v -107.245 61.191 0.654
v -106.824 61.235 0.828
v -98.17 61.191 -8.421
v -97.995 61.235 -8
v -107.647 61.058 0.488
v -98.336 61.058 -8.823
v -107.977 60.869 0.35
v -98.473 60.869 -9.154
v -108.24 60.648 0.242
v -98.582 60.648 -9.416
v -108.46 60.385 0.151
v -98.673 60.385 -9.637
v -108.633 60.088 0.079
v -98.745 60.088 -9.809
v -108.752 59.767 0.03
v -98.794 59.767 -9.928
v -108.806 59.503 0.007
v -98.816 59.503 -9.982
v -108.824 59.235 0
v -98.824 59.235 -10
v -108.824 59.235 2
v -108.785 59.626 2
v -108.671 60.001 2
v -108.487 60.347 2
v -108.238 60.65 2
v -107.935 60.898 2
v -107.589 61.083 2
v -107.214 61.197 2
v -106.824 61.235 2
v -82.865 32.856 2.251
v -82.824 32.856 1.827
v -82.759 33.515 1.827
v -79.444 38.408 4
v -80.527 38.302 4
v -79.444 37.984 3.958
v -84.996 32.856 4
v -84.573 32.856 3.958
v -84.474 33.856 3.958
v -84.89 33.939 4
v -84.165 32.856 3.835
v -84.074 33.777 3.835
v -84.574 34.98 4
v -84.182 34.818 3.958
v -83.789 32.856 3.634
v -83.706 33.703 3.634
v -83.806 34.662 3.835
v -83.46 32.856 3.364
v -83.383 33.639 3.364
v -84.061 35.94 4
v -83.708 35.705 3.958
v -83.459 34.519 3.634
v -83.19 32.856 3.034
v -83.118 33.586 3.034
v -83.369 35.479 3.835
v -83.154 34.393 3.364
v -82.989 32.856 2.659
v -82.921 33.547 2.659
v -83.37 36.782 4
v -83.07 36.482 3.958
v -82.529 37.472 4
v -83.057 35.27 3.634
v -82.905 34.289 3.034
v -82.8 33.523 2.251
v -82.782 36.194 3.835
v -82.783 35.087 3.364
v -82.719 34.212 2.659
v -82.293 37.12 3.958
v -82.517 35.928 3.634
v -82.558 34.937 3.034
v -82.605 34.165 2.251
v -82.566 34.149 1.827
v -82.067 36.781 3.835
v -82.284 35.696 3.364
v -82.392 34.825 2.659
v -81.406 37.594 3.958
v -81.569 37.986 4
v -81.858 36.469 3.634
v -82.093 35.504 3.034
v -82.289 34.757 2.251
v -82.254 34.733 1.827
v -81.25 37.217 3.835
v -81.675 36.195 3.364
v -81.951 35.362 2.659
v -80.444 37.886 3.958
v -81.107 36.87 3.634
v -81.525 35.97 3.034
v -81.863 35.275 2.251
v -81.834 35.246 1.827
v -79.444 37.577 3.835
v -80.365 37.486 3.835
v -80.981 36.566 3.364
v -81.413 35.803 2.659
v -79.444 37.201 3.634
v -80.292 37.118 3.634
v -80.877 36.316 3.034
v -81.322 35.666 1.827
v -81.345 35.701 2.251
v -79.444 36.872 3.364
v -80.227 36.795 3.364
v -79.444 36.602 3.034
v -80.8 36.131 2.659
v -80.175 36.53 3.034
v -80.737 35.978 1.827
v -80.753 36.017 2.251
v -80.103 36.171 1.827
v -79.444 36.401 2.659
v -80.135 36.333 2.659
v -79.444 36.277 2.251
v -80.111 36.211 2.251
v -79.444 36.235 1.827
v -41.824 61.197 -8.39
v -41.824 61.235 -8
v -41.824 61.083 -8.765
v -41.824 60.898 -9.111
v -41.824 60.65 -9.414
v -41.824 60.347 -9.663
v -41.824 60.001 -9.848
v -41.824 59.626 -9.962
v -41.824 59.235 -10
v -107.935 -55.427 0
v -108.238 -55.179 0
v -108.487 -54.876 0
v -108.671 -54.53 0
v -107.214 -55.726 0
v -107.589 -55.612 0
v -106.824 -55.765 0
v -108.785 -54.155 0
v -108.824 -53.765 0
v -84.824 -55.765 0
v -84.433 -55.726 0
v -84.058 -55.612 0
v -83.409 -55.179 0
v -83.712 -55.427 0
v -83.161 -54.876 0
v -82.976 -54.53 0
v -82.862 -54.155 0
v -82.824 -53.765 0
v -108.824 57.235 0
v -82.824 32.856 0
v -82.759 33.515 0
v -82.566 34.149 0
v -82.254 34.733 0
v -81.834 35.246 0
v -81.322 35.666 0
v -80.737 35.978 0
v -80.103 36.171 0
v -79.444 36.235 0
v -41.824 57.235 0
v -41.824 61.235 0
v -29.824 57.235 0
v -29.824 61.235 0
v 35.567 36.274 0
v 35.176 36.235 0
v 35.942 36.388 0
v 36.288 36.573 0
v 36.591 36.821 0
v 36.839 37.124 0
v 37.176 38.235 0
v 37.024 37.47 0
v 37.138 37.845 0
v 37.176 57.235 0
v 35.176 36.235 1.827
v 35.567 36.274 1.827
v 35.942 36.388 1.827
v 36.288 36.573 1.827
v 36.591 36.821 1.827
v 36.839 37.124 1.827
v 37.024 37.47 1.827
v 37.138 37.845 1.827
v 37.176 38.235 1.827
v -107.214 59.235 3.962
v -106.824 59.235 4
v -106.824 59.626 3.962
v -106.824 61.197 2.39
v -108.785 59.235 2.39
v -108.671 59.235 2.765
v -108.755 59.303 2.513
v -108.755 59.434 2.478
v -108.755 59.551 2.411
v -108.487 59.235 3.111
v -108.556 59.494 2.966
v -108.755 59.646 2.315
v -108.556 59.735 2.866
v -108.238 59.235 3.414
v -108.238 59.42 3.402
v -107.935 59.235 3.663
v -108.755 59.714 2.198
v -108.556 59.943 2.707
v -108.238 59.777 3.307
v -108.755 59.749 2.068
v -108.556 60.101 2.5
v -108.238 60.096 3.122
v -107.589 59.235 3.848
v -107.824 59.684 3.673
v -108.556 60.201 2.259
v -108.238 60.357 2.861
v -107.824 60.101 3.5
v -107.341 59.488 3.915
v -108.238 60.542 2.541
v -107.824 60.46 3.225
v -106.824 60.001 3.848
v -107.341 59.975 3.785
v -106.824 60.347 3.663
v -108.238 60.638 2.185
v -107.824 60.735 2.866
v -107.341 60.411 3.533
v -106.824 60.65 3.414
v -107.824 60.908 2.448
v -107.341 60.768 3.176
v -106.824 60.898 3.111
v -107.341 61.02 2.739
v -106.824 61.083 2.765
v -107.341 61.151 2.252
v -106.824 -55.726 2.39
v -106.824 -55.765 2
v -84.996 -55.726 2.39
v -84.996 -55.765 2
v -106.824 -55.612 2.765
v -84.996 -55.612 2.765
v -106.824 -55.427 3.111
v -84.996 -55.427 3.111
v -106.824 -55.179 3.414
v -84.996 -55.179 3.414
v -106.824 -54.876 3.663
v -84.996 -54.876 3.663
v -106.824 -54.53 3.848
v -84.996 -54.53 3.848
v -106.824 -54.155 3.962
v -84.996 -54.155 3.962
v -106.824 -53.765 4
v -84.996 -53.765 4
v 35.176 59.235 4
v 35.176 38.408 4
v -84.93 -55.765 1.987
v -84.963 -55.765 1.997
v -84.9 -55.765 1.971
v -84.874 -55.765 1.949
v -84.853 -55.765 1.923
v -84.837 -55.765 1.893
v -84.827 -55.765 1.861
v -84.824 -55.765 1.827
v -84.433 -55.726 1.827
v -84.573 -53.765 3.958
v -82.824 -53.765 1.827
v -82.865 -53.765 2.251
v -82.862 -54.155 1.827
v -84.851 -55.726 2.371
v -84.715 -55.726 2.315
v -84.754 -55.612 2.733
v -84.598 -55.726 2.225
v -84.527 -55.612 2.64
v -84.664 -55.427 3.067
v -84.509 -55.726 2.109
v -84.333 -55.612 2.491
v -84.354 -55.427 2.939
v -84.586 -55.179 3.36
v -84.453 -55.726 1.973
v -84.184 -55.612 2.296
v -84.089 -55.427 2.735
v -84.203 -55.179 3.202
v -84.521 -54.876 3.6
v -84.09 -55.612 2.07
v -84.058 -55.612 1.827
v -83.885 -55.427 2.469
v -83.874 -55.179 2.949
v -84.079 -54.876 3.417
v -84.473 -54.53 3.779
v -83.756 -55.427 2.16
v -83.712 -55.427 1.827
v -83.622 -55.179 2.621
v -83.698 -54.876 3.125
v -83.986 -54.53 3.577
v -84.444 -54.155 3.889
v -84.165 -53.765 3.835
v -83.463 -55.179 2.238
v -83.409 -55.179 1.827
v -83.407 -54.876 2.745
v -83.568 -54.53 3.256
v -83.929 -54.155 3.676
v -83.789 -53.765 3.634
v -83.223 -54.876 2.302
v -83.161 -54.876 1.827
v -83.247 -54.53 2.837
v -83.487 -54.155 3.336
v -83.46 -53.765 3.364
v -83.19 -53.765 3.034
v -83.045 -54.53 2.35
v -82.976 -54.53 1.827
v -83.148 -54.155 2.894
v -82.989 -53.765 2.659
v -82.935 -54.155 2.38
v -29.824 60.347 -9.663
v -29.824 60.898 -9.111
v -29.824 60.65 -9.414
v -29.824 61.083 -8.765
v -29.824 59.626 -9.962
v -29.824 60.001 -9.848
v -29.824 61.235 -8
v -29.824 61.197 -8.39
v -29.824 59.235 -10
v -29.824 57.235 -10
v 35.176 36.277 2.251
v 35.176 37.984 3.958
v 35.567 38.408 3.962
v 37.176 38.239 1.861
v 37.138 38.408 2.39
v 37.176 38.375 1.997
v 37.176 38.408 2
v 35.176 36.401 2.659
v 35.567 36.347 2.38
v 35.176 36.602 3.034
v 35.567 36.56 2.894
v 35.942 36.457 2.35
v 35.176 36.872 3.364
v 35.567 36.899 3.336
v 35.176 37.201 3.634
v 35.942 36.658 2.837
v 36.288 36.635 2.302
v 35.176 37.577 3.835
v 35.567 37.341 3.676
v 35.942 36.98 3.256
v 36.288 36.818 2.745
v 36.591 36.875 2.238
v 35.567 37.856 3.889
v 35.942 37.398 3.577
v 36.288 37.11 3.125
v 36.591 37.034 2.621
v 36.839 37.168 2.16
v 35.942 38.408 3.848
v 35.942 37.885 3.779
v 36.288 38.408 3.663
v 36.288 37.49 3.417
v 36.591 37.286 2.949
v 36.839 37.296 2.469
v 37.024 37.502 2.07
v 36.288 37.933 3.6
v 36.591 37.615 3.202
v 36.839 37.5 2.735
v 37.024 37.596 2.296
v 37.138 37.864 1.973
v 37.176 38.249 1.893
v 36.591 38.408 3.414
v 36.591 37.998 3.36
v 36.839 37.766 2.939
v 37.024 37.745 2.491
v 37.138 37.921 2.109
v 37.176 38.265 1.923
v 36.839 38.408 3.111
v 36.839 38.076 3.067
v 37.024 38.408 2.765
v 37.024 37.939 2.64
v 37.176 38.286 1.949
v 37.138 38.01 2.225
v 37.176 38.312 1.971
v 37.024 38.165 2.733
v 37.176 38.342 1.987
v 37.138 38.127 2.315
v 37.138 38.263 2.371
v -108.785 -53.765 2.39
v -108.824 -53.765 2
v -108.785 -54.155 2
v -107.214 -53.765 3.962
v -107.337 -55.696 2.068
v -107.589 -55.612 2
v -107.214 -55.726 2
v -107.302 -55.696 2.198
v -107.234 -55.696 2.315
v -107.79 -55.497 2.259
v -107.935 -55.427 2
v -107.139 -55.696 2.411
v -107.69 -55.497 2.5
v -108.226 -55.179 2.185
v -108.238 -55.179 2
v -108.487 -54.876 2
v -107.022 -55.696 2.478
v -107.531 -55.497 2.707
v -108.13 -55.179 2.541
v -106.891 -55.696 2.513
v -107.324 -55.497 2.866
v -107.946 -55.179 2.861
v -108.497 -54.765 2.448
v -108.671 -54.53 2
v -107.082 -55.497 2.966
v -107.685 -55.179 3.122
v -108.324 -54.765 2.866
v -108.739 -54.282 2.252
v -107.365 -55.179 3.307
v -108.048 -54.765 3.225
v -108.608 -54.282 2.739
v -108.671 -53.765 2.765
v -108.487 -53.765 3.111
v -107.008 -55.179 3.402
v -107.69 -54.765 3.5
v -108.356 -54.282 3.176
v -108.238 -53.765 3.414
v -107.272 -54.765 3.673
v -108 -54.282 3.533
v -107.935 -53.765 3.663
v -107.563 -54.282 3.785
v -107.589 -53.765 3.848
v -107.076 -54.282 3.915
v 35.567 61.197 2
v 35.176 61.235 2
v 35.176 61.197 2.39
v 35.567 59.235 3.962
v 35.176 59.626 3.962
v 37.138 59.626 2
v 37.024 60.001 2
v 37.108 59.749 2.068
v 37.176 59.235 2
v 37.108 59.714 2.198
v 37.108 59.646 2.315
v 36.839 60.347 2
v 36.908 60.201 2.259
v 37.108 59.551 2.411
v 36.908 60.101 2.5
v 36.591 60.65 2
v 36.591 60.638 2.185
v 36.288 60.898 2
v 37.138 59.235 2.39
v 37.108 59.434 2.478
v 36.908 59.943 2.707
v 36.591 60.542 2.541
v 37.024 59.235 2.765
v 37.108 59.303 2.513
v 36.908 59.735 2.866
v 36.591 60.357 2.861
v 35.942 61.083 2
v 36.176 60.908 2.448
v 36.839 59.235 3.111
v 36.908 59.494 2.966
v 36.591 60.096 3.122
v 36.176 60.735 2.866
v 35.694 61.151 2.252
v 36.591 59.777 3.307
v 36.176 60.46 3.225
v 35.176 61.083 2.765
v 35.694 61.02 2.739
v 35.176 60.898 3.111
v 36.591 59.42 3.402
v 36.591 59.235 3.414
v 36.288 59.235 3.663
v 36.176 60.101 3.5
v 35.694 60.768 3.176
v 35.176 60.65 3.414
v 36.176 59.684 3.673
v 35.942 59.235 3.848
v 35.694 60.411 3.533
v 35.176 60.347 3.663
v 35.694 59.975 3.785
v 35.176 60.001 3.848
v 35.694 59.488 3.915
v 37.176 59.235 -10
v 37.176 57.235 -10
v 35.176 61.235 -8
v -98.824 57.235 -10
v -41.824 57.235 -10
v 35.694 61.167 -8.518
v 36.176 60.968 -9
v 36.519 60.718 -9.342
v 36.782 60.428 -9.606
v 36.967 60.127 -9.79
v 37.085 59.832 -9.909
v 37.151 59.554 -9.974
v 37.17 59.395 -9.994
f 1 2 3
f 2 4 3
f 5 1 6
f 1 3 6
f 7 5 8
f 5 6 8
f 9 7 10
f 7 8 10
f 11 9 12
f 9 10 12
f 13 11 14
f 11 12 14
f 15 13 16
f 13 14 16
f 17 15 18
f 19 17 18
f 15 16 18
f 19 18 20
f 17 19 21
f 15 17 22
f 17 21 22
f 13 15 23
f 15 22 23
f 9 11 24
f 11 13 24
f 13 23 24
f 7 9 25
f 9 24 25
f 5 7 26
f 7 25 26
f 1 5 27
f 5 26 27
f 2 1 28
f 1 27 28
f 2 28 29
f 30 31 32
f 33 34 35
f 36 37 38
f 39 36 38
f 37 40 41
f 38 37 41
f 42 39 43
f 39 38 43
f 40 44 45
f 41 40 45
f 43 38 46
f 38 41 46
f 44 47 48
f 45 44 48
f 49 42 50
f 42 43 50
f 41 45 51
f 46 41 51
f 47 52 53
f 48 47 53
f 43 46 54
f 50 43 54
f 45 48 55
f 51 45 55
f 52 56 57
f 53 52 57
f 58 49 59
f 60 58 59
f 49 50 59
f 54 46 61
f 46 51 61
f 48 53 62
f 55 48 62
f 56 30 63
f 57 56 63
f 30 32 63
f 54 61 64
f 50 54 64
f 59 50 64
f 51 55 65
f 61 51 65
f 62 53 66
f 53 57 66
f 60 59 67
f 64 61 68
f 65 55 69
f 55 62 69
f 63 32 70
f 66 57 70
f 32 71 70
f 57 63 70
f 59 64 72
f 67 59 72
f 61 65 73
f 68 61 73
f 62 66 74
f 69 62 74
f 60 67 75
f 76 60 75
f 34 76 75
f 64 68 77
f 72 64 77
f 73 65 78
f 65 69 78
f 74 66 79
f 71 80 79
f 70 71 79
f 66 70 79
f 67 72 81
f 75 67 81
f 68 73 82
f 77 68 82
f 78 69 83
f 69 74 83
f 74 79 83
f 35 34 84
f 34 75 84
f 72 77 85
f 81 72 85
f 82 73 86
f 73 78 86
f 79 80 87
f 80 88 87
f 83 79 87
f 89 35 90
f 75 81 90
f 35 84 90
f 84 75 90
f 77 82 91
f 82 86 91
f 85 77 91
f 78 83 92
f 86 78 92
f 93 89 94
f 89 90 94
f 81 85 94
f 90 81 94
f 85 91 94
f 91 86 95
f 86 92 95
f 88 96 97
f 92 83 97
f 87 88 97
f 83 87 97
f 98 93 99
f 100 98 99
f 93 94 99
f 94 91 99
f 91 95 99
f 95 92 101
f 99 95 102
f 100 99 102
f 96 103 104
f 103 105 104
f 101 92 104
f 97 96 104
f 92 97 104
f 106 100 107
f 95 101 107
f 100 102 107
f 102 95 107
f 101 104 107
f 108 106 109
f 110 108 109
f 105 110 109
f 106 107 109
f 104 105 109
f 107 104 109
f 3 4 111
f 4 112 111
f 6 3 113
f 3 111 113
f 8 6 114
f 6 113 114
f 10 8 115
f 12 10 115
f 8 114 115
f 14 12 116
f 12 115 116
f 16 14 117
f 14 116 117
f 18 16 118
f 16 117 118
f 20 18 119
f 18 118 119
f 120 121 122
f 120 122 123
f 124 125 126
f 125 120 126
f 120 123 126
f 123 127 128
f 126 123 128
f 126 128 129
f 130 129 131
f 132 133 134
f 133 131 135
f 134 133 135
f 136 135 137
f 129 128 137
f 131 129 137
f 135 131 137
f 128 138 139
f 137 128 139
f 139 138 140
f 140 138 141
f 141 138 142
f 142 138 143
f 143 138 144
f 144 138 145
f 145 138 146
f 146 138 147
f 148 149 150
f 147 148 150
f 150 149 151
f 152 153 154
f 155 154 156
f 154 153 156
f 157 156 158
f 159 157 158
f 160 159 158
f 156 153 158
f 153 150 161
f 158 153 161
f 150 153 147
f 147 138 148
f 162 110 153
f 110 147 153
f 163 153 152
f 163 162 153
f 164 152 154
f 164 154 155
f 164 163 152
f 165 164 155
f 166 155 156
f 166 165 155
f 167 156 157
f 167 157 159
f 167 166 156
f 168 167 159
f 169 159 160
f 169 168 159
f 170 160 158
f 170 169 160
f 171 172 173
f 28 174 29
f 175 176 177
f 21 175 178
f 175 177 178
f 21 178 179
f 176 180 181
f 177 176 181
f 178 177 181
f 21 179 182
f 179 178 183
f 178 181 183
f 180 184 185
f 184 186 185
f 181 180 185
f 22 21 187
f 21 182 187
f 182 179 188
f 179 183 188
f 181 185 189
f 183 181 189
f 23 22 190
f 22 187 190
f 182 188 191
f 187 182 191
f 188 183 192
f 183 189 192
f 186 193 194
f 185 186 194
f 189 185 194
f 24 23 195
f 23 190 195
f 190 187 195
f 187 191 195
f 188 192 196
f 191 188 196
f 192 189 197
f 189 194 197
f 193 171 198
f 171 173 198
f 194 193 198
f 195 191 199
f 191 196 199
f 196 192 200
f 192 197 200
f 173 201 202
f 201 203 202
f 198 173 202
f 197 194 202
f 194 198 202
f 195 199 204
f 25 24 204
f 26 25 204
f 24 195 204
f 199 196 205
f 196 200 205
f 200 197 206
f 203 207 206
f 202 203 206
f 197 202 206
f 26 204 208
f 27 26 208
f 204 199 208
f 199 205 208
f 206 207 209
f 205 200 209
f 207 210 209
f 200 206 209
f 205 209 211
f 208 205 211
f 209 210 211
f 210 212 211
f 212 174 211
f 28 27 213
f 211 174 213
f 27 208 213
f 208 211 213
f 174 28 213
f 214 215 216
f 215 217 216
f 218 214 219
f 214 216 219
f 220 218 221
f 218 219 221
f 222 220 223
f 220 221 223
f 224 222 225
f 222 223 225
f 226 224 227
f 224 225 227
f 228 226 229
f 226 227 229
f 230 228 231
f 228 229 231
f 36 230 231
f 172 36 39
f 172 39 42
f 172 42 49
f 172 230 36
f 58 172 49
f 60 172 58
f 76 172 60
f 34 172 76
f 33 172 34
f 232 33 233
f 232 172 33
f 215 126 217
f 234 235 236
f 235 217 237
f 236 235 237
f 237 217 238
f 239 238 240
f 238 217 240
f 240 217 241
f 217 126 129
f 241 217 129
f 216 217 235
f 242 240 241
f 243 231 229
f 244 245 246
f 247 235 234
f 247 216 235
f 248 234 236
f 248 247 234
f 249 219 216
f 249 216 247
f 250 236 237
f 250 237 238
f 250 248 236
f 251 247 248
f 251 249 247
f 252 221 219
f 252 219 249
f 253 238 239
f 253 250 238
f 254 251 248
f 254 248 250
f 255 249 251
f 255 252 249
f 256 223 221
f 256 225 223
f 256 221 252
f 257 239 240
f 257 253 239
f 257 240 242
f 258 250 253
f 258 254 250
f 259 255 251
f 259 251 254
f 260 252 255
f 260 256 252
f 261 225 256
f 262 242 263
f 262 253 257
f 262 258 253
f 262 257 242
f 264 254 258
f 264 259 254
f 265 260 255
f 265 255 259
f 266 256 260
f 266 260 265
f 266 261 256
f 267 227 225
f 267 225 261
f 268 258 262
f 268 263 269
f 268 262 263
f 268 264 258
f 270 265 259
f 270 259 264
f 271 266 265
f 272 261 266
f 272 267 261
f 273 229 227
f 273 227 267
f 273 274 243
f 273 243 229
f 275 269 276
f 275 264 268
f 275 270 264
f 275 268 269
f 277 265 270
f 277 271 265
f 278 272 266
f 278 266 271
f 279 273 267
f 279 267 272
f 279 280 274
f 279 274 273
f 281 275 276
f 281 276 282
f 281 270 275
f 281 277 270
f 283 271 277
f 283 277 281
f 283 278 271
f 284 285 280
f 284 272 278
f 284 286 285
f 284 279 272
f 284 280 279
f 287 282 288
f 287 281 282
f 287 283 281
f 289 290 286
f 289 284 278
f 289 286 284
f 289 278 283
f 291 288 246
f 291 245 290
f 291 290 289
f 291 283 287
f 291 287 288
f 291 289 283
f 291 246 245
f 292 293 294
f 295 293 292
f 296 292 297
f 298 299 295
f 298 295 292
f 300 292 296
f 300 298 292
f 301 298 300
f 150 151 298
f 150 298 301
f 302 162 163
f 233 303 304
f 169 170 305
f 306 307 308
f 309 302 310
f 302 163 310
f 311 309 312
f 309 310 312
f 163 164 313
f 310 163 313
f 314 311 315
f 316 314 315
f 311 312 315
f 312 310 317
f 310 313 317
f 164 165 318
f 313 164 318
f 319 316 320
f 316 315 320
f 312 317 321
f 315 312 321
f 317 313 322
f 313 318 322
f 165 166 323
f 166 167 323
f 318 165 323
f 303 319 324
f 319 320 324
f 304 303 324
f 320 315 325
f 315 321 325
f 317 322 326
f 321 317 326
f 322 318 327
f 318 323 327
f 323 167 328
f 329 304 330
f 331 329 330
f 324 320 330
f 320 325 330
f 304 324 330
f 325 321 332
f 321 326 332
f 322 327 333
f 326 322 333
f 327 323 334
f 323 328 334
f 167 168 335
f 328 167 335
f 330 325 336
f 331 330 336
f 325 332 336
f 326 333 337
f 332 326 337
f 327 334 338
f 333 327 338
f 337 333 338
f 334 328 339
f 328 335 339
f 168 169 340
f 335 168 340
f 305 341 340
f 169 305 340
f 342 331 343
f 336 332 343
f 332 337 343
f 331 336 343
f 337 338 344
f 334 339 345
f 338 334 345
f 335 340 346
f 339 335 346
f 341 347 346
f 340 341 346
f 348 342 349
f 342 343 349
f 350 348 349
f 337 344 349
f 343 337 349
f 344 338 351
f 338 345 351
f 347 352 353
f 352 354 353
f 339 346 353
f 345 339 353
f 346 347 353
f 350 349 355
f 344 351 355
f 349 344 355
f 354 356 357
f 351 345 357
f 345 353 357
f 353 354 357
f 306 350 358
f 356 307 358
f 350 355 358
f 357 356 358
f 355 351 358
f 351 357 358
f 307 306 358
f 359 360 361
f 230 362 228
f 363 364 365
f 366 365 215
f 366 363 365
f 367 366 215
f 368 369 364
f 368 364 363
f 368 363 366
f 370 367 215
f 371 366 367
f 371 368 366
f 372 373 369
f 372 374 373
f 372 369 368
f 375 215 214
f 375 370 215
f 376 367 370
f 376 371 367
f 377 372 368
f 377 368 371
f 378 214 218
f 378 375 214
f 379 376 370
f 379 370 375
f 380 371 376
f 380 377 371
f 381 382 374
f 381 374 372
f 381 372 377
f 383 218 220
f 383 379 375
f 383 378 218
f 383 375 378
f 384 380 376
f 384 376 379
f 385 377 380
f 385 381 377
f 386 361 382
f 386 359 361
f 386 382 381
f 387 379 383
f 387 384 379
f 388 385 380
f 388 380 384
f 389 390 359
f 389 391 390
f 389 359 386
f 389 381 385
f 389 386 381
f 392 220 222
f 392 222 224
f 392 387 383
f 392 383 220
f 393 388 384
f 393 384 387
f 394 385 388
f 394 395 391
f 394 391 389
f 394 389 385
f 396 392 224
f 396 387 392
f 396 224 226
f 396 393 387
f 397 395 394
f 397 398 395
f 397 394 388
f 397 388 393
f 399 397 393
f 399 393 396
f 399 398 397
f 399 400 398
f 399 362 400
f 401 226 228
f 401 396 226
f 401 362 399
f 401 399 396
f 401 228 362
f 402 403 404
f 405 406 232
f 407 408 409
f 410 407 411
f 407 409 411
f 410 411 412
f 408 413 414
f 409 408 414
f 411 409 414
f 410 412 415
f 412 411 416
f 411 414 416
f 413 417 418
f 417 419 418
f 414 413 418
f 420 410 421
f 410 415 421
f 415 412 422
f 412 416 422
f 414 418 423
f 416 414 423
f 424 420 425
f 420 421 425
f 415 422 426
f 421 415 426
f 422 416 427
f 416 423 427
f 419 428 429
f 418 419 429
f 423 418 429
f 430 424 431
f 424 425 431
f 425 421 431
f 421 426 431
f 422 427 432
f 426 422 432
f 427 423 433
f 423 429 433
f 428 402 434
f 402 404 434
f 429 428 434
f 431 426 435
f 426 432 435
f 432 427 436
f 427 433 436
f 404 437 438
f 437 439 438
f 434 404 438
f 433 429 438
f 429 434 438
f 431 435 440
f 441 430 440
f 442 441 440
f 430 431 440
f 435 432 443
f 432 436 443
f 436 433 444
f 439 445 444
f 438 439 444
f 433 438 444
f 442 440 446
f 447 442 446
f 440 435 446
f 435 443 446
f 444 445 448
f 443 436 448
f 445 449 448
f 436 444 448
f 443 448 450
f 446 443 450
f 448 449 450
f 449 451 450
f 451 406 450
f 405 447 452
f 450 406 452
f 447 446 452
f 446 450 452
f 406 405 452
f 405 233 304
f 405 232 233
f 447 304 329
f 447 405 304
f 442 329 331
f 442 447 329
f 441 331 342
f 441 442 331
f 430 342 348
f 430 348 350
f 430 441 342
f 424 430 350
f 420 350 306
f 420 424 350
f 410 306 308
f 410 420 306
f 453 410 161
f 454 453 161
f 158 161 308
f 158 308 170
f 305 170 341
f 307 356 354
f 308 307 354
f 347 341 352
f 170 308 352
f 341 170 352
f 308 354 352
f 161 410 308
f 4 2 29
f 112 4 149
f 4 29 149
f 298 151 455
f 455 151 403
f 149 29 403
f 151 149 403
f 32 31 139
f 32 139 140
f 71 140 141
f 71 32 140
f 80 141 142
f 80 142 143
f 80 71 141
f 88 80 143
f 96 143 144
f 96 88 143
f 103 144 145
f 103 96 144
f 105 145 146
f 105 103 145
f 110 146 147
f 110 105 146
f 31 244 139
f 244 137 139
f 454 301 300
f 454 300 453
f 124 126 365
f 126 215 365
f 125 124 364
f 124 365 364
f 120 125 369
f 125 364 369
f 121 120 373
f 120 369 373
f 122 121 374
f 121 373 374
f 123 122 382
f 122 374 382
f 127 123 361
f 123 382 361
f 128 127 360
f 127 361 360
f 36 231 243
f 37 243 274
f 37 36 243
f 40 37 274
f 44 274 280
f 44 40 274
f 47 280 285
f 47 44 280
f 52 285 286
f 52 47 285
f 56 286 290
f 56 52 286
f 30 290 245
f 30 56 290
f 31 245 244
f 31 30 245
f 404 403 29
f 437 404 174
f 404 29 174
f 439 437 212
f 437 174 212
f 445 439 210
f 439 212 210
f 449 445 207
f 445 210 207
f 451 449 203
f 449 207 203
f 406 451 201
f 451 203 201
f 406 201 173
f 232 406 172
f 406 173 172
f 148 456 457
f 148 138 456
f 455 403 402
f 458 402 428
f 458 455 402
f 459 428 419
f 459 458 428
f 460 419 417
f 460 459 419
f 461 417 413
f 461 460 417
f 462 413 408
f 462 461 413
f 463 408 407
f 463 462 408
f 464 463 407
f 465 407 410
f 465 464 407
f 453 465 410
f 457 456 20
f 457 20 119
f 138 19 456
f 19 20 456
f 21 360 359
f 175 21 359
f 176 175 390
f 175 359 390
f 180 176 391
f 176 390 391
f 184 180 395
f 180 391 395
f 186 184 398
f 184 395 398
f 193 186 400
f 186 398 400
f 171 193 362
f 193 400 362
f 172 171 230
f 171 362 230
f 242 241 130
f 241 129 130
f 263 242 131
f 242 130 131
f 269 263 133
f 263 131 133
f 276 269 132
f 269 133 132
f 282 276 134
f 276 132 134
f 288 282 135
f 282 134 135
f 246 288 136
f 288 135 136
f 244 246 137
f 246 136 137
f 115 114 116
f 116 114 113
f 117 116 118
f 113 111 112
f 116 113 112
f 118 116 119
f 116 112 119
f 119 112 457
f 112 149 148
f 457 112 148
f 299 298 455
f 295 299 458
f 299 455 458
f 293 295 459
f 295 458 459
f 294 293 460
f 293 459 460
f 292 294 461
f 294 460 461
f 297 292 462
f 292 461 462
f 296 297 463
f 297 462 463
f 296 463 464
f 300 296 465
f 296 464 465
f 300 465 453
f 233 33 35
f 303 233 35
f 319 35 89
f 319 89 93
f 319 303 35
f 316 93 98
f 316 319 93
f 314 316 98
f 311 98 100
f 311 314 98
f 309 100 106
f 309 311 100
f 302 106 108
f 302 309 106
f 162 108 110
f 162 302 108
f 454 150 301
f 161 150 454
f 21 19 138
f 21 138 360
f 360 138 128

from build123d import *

# Parameters (mm, degrees)
F1_DEPTH = 4
F2_W     = 67
F2_H     = 4
F3_DEPTH = 10
F4_R     = 3.3798989873
F5_R     = 2.1727922061
F6_SIZE  = 10
F7_R     = 2
F8_R     = 2


with BuildPart() as f1:
    # F0 (on Top) → F1 (new body)
    with BuildSketch(Plane.XY):
        Polygon((37.1763631701, 61.2354552448), (-108.8236368299, 61.2354552448), (-108.8236368299, 36.2354552448), (-108.8236368299, -55.7645447552), (-82.8236368299, -55.7645447552), (-82.8236368299, 36.2354552448), (37.1763631701, 36.2354552448), align=None)
    extrude(amount=F1_DEPTH)

    # F2 (on face) → F3 (join)
    with BuildSketch(Plane(origin=(0, 0, 0), x_dir=(1, 0, 0), z_dir=(0, 0, -1))):
        with Locations((3.6763631701, -59.2354552448)):
            Rectangle(F2_W, F2_H)
        with Locations((-75.3236368299, -59.2354552448)):
            Rectangle(F2_W, F2_H)
    extrude(amount=F3_DEPTH)

    # F4
    f4_edges = [f1.edges().sort_by_distance(p)[0] for p in [
        (-82.823637, 36.235455, 2),
    ]]
    fillet(f4_edges, radius=F4_R)

    # F5
    f5_edges = [f1.edges().sort_by_distance(p)[0] for p in [
        (-82.823637, -11.454494, 4),
        (-21.133687, 36.235455, 4),
    ]]
    fillet(f5_edges, radius=F5_R)

    # F6
    f6_edges = [f1.edges().sort_by_distance(p)[0] for p in [
        (-108.823637, 59.235455, -10),
    ]]
    chamfer(f6_edges, length=F6_SIZE)

    # F7
    f7_edges = [f1.edges().sort_by_distance(p)[0] for p in [
        (-103.823637, 61.235455, -5),
        (-35.823637, 61.235455, 4),
        (-108.823637, 2.735455, 4),
        (-108.823637, 61.235455, 2),
        (37.176363, 61.235455, -3),
        (3.676363, 61.235455, -10),
        (-70.323637, 61.235455, -10),
        (37.176363, 49.821851, 4),
    ]]
    fillet(f7_edges, radius=F7_R)

    # F8
    f8_edges = [f1.edges().sort_by_distance(p)[0] for p in [
        (-95.910033, -55.764545, 4),
    ]]
    fillet(f8_edges, radius=F8_R)


solid = f1.part
